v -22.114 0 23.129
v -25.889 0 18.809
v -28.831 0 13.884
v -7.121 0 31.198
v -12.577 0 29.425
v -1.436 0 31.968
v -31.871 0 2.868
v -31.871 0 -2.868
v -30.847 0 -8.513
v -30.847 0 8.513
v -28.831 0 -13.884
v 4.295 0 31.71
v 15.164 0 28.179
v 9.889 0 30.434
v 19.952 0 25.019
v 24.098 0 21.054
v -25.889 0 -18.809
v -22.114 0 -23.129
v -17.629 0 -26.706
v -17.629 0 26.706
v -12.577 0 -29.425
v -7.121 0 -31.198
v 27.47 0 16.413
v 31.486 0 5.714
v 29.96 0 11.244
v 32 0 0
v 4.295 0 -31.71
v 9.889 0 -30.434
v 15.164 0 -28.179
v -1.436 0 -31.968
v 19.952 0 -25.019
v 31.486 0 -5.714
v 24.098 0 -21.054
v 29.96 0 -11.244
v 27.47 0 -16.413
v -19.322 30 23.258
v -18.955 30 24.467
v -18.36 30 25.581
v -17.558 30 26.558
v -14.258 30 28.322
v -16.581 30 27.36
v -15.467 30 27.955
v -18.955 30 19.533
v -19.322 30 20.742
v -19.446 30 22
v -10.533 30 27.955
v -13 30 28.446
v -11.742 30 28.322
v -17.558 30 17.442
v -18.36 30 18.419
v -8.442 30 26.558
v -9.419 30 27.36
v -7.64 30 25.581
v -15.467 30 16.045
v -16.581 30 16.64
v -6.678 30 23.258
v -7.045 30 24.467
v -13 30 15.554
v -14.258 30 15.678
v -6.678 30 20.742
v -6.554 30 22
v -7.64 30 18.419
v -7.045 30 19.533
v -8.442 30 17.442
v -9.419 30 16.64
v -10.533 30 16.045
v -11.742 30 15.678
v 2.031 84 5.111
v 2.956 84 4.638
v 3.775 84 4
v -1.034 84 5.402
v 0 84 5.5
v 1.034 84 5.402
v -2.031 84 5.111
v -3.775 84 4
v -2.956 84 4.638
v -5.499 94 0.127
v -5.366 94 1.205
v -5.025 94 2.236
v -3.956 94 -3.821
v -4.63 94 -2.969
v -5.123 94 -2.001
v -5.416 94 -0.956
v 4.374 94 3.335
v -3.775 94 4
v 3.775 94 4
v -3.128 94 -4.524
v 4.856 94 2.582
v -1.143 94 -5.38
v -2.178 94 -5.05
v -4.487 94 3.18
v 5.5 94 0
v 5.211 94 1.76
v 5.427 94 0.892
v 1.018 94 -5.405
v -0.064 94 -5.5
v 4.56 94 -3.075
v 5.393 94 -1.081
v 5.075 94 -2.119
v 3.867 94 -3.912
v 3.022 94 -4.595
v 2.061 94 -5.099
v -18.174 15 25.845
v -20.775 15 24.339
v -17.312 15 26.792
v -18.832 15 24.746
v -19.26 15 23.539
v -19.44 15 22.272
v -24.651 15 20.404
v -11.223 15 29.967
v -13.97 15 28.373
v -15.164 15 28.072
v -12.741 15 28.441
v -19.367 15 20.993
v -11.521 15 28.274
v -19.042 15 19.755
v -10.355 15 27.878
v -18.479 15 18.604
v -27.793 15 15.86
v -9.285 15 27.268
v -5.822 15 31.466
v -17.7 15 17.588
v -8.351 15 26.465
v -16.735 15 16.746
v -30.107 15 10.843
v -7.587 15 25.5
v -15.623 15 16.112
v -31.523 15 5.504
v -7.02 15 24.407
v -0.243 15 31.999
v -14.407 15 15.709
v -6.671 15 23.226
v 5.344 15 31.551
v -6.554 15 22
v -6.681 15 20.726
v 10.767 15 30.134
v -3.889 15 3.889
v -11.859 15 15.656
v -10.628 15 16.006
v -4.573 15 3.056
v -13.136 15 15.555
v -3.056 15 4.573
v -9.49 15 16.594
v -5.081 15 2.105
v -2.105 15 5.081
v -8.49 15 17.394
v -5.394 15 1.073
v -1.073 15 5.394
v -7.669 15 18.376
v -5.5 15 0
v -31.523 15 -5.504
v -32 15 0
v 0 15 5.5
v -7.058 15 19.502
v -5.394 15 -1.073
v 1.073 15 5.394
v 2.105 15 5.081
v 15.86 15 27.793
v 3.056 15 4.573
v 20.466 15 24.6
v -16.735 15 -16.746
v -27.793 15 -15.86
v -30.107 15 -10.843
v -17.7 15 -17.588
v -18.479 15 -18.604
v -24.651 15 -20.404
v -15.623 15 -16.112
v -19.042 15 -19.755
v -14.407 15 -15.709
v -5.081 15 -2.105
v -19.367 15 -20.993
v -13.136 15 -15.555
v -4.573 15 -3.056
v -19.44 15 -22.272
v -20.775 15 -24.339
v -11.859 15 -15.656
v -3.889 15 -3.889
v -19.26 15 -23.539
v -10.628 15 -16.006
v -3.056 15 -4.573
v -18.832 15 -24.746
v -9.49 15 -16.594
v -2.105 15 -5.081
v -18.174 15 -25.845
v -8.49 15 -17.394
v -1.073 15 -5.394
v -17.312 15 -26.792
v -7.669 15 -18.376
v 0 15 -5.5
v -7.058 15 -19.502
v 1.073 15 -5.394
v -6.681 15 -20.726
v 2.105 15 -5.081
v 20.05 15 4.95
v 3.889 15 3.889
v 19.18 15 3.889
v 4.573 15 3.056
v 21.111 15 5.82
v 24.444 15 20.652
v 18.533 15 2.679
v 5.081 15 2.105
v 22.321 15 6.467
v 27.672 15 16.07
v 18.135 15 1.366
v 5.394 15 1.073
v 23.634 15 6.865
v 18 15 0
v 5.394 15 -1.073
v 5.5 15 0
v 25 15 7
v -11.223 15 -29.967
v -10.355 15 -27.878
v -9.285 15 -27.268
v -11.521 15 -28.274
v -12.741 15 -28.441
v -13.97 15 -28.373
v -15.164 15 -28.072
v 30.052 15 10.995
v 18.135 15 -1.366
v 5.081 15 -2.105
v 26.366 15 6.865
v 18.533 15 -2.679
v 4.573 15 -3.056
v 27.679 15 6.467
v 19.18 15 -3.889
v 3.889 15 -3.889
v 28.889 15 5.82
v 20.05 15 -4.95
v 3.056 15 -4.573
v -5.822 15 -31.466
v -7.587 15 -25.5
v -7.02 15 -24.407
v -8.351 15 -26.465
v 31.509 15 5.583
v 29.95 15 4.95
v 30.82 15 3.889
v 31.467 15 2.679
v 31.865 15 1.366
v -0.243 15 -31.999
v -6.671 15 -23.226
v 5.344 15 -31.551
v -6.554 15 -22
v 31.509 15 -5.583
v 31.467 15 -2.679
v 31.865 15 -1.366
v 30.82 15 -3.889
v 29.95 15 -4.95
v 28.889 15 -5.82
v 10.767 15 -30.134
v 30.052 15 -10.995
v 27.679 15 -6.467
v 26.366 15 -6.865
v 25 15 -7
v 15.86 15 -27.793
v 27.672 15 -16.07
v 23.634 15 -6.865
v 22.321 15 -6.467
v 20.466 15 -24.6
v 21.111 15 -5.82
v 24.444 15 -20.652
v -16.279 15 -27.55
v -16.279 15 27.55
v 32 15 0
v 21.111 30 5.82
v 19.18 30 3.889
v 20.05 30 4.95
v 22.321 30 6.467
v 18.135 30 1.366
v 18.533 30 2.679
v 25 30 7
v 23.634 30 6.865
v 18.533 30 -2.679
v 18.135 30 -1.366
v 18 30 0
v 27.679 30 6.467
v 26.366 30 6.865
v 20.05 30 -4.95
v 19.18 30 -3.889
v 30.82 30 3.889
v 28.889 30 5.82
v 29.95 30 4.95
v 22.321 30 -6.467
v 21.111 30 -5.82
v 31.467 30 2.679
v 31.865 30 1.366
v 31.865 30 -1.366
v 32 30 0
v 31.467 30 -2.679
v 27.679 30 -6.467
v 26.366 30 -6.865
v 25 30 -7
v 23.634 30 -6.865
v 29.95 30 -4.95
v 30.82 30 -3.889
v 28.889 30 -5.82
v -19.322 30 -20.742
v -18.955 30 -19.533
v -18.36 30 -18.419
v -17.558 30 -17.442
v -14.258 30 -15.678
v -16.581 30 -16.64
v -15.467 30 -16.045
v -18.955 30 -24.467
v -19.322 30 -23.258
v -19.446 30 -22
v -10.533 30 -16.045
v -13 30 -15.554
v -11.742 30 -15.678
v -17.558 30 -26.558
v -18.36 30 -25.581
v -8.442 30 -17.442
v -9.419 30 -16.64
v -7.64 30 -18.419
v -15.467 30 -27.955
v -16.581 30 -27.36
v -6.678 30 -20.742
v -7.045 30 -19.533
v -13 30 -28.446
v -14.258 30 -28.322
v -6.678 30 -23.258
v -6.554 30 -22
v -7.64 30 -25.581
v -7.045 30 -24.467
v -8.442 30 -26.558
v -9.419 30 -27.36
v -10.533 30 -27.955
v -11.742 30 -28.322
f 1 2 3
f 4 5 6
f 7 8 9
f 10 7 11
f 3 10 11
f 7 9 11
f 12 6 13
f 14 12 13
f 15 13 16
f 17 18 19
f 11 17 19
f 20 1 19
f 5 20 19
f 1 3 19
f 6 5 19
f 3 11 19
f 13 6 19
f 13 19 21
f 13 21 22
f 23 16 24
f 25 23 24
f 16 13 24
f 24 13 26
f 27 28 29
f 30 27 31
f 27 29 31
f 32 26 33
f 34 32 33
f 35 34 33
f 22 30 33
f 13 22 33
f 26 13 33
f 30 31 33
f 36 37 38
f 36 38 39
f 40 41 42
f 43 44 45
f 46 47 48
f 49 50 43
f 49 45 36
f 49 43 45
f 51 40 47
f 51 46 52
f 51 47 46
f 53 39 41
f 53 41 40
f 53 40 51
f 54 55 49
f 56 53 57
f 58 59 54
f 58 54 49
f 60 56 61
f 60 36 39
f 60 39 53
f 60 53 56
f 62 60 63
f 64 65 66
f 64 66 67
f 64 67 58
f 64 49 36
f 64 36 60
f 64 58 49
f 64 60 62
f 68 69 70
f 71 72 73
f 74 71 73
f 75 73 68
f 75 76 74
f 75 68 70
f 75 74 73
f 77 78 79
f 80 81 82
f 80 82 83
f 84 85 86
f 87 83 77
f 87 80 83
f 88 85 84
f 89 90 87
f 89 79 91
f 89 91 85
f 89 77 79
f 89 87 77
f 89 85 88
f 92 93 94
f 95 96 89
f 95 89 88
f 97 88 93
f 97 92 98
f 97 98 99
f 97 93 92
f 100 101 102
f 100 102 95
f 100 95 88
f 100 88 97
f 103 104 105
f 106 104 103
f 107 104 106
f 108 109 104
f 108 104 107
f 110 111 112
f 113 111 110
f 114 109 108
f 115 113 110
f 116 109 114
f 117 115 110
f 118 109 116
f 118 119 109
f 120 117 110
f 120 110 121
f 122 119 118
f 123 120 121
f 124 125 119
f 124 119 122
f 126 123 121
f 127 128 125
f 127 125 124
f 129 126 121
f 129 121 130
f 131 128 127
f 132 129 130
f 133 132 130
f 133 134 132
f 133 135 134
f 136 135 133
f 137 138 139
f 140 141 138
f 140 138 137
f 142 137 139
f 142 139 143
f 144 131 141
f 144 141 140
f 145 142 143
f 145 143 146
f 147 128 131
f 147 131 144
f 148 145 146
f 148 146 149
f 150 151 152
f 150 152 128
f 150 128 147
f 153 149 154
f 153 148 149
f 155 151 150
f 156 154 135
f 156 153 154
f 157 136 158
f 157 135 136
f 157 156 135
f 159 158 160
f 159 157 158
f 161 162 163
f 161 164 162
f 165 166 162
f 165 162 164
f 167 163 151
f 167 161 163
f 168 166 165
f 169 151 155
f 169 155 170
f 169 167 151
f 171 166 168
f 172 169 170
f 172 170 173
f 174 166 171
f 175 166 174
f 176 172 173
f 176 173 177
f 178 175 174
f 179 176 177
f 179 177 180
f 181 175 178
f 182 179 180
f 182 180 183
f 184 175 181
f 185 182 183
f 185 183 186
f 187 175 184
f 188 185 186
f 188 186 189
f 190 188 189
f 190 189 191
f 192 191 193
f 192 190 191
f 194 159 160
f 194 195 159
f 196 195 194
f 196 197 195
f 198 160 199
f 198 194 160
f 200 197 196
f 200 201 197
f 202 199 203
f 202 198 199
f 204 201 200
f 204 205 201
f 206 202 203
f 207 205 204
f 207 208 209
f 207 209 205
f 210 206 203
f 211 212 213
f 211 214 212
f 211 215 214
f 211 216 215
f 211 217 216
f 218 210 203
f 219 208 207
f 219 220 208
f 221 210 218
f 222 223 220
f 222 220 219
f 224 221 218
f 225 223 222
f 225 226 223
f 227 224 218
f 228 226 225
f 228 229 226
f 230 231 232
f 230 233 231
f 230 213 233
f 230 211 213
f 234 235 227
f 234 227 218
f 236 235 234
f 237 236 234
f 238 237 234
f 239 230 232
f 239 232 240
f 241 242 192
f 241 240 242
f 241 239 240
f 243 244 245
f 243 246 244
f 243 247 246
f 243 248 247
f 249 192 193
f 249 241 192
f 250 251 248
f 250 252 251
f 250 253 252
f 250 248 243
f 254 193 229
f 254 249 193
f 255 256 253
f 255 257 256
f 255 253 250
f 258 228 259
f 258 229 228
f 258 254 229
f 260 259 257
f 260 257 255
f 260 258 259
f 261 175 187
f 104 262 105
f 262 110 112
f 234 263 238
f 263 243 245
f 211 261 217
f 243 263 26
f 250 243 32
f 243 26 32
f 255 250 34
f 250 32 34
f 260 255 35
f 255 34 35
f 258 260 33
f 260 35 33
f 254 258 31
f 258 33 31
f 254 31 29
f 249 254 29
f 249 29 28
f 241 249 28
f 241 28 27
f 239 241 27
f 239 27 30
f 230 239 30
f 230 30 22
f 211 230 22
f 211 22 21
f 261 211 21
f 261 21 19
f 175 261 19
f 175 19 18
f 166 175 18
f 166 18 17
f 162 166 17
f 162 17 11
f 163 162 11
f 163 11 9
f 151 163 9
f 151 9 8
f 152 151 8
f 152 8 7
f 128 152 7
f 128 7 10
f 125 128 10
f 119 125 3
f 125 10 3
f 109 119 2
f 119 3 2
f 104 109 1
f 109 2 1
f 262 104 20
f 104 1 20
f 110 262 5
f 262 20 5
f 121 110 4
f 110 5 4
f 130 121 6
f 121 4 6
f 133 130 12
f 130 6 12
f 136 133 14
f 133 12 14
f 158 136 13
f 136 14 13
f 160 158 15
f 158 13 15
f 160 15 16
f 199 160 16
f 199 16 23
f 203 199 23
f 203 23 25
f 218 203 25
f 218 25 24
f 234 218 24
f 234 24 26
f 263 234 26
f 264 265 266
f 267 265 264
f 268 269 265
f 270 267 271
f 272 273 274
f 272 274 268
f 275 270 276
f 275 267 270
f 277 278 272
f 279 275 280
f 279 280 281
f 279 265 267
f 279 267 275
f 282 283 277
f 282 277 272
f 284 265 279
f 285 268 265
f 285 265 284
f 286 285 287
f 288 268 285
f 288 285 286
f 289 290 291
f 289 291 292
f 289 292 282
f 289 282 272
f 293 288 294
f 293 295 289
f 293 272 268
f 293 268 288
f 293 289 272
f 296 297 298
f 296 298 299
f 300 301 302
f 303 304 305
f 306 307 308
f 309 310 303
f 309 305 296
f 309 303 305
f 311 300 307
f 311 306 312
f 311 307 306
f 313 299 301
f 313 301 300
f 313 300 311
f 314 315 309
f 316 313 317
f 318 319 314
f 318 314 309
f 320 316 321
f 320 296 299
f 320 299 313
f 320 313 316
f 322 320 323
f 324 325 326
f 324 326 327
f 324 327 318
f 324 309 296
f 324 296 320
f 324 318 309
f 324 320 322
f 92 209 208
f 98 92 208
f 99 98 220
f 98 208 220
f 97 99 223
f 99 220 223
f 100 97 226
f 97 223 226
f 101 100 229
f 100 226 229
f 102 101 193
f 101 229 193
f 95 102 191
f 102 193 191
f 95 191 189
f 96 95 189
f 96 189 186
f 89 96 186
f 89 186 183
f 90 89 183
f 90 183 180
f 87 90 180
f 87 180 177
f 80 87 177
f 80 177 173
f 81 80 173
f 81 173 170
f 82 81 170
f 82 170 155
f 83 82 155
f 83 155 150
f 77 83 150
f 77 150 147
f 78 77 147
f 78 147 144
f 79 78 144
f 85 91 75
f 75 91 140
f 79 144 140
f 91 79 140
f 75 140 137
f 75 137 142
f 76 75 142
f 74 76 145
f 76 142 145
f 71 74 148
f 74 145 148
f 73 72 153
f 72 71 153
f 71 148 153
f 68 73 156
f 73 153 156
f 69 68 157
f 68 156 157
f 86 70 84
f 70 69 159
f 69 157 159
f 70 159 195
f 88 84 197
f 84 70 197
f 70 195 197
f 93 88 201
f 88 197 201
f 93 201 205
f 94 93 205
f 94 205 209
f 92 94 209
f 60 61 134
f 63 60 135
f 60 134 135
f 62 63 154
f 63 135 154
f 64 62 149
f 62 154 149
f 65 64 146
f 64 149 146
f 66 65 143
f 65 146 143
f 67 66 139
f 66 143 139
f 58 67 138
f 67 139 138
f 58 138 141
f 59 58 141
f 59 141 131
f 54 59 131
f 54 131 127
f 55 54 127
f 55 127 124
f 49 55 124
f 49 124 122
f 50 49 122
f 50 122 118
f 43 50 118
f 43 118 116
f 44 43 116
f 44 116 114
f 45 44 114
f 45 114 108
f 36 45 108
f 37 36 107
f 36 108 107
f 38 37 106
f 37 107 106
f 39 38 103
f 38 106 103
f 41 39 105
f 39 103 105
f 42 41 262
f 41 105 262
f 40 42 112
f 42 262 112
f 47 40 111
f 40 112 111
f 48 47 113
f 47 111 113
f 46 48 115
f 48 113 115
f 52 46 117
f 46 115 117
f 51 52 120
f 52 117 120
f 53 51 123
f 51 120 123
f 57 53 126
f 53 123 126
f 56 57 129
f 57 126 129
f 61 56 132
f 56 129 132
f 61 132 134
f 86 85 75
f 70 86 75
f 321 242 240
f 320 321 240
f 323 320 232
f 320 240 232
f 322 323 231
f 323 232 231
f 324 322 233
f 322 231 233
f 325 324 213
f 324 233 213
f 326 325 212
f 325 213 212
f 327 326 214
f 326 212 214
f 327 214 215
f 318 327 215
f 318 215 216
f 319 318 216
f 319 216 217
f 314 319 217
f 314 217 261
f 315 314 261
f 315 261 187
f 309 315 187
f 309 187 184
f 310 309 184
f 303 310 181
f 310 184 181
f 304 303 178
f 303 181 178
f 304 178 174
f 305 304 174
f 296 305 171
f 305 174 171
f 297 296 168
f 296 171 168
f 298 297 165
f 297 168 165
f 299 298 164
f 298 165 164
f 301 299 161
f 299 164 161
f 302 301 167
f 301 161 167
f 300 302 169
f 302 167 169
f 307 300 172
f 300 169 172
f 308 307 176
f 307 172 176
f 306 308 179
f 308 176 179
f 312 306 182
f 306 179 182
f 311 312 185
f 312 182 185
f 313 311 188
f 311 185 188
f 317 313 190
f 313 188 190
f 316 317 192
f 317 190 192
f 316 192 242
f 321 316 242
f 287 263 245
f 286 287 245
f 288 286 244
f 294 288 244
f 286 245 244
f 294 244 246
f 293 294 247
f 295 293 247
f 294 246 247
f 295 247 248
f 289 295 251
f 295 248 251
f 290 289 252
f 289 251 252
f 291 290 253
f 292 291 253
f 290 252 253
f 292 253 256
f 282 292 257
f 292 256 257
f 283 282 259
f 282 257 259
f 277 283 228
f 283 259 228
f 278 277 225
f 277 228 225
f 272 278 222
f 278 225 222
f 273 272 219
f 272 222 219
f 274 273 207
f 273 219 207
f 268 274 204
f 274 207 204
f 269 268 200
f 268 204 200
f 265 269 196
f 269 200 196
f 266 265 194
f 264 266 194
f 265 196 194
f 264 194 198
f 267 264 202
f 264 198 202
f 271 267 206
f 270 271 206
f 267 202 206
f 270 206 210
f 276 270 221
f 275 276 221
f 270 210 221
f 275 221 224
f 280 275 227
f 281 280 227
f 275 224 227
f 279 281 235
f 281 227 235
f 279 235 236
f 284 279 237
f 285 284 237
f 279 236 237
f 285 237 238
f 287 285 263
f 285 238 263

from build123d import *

# Parameters (mm, degrees)
SKETCH1_R               = 32
BOSS_EXTRUDE1_DEPTH     = 15
SKETCH2_R               = 7
SKETCH2_R_2             = 6.446135322
BOSS_EXTRUDE2_DEPTH     = 15
SKETCH3_R               = 5.5
BOSS_EXTRUDE3_DEPTH     = 79
CUT_EXTRUDE1_DEPTH      = 79
CUT_EXTRUDE1_DEPTH_BACK = 79


with BuildPart() as part:
    # Sketch1 → Boss-Extrude1 (new body)
    with BuildSketch(Plane(origin=(0, 0, 0), x_dir=(1, 0, 0), z_dir=(0, 1, 0))):
        Circle(SKETCH1_R)
    extrude(amount=BOSS_EXTRUDE1_DEPTH)

    # Sketch2 → Boss-Extrude2 (add)
    with BuildSketch(Plane(origin=(0, 15, 0), x_dir=(1, 0, 0), z_dir=(0, 1, 0))):
        with Locations((25, 0)):
            Circle(SKETCH2_R)
        with Locations((-13, 22)):
            Circle(SKETCH2_R_2)
        with Locations((-13, -22)):
            Circle(SKETCH2_R_2)
    extrude(amount=BOSS_EXTRUDE2_DEPTH)

    # Sketch3 → Boss-Extrude3 (add)
    with BuildSketch(Plane(origin=(0, 15, 0), x_dir=(1, 0, 0), z_dir=(0, 1, 0))):
        Circle(SKETCH3_R)
    extrude(amount=BOSS_EXTRUDE3_DEPTH)

    # Sketch4 → Cut-Extrude1 (cut, two sides: drawn at the far end of the back side and taken through both)
    with BuildSketch(Plane(origin=(0, 0, 0), x_dir=(0, 0, -1), z_dir=(1, 0, 0)).offset(-CUT_EXTRUDE1_DEPTH_BACK)):
        Polygon((-4.5, 84), (-8.757640736, 84), (-8.757640736, 94), (-4.5, 94), (-4, 94), (-4, 84), align=None)
    extrude(amount=CUT_EXTRUDE1_DEPTH + CUT_EXTRUDE1_DEPTH_BACK, mode=Mode.SUBTRACT)


solid = part.part
